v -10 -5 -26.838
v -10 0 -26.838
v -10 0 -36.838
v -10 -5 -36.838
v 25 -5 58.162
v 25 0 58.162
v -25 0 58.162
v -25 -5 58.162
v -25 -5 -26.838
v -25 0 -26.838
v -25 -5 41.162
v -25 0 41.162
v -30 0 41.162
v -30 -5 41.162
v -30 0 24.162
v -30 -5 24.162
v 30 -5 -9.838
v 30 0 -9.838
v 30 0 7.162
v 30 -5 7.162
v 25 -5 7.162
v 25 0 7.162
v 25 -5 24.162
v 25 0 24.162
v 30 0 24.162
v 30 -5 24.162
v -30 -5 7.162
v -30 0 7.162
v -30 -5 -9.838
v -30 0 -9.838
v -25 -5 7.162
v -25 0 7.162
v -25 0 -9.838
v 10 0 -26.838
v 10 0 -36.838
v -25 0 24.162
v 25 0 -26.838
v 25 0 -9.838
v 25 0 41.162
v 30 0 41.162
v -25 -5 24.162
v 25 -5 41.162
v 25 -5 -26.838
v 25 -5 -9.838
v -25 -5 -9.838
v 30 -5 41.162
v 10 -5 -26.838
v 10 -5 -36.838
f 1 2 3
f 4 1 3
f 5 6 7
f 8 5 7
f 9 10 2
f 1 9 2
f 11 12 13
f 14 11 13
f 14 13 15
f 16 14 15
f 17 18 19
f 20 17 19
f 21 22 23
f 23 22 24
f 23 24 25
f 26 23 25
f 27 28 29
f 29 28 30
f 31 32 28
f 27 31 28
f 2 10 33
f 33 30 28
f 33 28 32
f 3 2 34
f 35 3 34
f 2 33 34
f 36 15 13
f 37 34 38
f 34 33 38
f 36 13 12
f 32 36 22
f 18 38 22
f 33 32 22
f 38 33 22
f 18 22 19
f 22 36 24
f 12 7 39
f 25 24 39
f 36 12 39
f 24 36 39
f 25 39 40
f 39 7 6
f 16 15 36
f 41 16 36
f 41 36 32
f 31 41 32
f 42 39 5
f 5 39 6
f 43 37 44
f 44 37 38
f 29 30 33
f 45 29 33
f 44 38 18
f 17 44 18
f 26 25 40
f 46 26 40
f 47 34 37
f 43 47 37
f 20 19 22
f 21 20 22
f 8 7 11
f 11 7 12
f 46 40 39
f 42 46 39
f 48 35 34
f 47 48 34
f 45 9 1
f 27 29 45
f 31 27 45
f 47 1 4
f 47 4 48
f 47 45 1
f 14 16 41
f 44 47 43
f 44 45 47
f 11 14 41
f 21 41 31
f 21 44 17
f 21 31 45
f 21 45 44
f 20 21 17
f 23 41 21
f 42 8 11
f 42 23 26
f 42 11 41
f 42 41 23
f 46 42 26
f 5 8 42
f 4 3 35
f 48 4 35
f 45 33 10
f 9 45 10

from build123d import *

# Parameters (mm, degrees)
F1_DEPTH = 5


with BuildPart() as f1:
    # F0 (on Front) → F1 (new body)
    with BuildSketch(Plane.XZ):
        Polygon((25, 41.161765), (25, 58.161765), (-25, 58.161765), (-25, 41.161765), (-30, 41.161765), (-30, 24.161765), (-25, 24.161765), (-25, 7.161765), (-30, 7.161765), (-30, -9.838235), (-25, -9.838235), (-25, -26.838235), (-10, -26.838235), (-10, -31.838235), (-10, -36.838235), (10, -36.838235), (10, -31.838235), (10, -26.838235), (25, -26.838235), (25, -9.838235), (30, -9.838235), (30, 7.161765), (25, 7.161765), (25, 24.161765), (30, 24.161765), (30, 41.161765), align=None)
    extrude(amount=F1_DEPTH)


solid = f1.part
